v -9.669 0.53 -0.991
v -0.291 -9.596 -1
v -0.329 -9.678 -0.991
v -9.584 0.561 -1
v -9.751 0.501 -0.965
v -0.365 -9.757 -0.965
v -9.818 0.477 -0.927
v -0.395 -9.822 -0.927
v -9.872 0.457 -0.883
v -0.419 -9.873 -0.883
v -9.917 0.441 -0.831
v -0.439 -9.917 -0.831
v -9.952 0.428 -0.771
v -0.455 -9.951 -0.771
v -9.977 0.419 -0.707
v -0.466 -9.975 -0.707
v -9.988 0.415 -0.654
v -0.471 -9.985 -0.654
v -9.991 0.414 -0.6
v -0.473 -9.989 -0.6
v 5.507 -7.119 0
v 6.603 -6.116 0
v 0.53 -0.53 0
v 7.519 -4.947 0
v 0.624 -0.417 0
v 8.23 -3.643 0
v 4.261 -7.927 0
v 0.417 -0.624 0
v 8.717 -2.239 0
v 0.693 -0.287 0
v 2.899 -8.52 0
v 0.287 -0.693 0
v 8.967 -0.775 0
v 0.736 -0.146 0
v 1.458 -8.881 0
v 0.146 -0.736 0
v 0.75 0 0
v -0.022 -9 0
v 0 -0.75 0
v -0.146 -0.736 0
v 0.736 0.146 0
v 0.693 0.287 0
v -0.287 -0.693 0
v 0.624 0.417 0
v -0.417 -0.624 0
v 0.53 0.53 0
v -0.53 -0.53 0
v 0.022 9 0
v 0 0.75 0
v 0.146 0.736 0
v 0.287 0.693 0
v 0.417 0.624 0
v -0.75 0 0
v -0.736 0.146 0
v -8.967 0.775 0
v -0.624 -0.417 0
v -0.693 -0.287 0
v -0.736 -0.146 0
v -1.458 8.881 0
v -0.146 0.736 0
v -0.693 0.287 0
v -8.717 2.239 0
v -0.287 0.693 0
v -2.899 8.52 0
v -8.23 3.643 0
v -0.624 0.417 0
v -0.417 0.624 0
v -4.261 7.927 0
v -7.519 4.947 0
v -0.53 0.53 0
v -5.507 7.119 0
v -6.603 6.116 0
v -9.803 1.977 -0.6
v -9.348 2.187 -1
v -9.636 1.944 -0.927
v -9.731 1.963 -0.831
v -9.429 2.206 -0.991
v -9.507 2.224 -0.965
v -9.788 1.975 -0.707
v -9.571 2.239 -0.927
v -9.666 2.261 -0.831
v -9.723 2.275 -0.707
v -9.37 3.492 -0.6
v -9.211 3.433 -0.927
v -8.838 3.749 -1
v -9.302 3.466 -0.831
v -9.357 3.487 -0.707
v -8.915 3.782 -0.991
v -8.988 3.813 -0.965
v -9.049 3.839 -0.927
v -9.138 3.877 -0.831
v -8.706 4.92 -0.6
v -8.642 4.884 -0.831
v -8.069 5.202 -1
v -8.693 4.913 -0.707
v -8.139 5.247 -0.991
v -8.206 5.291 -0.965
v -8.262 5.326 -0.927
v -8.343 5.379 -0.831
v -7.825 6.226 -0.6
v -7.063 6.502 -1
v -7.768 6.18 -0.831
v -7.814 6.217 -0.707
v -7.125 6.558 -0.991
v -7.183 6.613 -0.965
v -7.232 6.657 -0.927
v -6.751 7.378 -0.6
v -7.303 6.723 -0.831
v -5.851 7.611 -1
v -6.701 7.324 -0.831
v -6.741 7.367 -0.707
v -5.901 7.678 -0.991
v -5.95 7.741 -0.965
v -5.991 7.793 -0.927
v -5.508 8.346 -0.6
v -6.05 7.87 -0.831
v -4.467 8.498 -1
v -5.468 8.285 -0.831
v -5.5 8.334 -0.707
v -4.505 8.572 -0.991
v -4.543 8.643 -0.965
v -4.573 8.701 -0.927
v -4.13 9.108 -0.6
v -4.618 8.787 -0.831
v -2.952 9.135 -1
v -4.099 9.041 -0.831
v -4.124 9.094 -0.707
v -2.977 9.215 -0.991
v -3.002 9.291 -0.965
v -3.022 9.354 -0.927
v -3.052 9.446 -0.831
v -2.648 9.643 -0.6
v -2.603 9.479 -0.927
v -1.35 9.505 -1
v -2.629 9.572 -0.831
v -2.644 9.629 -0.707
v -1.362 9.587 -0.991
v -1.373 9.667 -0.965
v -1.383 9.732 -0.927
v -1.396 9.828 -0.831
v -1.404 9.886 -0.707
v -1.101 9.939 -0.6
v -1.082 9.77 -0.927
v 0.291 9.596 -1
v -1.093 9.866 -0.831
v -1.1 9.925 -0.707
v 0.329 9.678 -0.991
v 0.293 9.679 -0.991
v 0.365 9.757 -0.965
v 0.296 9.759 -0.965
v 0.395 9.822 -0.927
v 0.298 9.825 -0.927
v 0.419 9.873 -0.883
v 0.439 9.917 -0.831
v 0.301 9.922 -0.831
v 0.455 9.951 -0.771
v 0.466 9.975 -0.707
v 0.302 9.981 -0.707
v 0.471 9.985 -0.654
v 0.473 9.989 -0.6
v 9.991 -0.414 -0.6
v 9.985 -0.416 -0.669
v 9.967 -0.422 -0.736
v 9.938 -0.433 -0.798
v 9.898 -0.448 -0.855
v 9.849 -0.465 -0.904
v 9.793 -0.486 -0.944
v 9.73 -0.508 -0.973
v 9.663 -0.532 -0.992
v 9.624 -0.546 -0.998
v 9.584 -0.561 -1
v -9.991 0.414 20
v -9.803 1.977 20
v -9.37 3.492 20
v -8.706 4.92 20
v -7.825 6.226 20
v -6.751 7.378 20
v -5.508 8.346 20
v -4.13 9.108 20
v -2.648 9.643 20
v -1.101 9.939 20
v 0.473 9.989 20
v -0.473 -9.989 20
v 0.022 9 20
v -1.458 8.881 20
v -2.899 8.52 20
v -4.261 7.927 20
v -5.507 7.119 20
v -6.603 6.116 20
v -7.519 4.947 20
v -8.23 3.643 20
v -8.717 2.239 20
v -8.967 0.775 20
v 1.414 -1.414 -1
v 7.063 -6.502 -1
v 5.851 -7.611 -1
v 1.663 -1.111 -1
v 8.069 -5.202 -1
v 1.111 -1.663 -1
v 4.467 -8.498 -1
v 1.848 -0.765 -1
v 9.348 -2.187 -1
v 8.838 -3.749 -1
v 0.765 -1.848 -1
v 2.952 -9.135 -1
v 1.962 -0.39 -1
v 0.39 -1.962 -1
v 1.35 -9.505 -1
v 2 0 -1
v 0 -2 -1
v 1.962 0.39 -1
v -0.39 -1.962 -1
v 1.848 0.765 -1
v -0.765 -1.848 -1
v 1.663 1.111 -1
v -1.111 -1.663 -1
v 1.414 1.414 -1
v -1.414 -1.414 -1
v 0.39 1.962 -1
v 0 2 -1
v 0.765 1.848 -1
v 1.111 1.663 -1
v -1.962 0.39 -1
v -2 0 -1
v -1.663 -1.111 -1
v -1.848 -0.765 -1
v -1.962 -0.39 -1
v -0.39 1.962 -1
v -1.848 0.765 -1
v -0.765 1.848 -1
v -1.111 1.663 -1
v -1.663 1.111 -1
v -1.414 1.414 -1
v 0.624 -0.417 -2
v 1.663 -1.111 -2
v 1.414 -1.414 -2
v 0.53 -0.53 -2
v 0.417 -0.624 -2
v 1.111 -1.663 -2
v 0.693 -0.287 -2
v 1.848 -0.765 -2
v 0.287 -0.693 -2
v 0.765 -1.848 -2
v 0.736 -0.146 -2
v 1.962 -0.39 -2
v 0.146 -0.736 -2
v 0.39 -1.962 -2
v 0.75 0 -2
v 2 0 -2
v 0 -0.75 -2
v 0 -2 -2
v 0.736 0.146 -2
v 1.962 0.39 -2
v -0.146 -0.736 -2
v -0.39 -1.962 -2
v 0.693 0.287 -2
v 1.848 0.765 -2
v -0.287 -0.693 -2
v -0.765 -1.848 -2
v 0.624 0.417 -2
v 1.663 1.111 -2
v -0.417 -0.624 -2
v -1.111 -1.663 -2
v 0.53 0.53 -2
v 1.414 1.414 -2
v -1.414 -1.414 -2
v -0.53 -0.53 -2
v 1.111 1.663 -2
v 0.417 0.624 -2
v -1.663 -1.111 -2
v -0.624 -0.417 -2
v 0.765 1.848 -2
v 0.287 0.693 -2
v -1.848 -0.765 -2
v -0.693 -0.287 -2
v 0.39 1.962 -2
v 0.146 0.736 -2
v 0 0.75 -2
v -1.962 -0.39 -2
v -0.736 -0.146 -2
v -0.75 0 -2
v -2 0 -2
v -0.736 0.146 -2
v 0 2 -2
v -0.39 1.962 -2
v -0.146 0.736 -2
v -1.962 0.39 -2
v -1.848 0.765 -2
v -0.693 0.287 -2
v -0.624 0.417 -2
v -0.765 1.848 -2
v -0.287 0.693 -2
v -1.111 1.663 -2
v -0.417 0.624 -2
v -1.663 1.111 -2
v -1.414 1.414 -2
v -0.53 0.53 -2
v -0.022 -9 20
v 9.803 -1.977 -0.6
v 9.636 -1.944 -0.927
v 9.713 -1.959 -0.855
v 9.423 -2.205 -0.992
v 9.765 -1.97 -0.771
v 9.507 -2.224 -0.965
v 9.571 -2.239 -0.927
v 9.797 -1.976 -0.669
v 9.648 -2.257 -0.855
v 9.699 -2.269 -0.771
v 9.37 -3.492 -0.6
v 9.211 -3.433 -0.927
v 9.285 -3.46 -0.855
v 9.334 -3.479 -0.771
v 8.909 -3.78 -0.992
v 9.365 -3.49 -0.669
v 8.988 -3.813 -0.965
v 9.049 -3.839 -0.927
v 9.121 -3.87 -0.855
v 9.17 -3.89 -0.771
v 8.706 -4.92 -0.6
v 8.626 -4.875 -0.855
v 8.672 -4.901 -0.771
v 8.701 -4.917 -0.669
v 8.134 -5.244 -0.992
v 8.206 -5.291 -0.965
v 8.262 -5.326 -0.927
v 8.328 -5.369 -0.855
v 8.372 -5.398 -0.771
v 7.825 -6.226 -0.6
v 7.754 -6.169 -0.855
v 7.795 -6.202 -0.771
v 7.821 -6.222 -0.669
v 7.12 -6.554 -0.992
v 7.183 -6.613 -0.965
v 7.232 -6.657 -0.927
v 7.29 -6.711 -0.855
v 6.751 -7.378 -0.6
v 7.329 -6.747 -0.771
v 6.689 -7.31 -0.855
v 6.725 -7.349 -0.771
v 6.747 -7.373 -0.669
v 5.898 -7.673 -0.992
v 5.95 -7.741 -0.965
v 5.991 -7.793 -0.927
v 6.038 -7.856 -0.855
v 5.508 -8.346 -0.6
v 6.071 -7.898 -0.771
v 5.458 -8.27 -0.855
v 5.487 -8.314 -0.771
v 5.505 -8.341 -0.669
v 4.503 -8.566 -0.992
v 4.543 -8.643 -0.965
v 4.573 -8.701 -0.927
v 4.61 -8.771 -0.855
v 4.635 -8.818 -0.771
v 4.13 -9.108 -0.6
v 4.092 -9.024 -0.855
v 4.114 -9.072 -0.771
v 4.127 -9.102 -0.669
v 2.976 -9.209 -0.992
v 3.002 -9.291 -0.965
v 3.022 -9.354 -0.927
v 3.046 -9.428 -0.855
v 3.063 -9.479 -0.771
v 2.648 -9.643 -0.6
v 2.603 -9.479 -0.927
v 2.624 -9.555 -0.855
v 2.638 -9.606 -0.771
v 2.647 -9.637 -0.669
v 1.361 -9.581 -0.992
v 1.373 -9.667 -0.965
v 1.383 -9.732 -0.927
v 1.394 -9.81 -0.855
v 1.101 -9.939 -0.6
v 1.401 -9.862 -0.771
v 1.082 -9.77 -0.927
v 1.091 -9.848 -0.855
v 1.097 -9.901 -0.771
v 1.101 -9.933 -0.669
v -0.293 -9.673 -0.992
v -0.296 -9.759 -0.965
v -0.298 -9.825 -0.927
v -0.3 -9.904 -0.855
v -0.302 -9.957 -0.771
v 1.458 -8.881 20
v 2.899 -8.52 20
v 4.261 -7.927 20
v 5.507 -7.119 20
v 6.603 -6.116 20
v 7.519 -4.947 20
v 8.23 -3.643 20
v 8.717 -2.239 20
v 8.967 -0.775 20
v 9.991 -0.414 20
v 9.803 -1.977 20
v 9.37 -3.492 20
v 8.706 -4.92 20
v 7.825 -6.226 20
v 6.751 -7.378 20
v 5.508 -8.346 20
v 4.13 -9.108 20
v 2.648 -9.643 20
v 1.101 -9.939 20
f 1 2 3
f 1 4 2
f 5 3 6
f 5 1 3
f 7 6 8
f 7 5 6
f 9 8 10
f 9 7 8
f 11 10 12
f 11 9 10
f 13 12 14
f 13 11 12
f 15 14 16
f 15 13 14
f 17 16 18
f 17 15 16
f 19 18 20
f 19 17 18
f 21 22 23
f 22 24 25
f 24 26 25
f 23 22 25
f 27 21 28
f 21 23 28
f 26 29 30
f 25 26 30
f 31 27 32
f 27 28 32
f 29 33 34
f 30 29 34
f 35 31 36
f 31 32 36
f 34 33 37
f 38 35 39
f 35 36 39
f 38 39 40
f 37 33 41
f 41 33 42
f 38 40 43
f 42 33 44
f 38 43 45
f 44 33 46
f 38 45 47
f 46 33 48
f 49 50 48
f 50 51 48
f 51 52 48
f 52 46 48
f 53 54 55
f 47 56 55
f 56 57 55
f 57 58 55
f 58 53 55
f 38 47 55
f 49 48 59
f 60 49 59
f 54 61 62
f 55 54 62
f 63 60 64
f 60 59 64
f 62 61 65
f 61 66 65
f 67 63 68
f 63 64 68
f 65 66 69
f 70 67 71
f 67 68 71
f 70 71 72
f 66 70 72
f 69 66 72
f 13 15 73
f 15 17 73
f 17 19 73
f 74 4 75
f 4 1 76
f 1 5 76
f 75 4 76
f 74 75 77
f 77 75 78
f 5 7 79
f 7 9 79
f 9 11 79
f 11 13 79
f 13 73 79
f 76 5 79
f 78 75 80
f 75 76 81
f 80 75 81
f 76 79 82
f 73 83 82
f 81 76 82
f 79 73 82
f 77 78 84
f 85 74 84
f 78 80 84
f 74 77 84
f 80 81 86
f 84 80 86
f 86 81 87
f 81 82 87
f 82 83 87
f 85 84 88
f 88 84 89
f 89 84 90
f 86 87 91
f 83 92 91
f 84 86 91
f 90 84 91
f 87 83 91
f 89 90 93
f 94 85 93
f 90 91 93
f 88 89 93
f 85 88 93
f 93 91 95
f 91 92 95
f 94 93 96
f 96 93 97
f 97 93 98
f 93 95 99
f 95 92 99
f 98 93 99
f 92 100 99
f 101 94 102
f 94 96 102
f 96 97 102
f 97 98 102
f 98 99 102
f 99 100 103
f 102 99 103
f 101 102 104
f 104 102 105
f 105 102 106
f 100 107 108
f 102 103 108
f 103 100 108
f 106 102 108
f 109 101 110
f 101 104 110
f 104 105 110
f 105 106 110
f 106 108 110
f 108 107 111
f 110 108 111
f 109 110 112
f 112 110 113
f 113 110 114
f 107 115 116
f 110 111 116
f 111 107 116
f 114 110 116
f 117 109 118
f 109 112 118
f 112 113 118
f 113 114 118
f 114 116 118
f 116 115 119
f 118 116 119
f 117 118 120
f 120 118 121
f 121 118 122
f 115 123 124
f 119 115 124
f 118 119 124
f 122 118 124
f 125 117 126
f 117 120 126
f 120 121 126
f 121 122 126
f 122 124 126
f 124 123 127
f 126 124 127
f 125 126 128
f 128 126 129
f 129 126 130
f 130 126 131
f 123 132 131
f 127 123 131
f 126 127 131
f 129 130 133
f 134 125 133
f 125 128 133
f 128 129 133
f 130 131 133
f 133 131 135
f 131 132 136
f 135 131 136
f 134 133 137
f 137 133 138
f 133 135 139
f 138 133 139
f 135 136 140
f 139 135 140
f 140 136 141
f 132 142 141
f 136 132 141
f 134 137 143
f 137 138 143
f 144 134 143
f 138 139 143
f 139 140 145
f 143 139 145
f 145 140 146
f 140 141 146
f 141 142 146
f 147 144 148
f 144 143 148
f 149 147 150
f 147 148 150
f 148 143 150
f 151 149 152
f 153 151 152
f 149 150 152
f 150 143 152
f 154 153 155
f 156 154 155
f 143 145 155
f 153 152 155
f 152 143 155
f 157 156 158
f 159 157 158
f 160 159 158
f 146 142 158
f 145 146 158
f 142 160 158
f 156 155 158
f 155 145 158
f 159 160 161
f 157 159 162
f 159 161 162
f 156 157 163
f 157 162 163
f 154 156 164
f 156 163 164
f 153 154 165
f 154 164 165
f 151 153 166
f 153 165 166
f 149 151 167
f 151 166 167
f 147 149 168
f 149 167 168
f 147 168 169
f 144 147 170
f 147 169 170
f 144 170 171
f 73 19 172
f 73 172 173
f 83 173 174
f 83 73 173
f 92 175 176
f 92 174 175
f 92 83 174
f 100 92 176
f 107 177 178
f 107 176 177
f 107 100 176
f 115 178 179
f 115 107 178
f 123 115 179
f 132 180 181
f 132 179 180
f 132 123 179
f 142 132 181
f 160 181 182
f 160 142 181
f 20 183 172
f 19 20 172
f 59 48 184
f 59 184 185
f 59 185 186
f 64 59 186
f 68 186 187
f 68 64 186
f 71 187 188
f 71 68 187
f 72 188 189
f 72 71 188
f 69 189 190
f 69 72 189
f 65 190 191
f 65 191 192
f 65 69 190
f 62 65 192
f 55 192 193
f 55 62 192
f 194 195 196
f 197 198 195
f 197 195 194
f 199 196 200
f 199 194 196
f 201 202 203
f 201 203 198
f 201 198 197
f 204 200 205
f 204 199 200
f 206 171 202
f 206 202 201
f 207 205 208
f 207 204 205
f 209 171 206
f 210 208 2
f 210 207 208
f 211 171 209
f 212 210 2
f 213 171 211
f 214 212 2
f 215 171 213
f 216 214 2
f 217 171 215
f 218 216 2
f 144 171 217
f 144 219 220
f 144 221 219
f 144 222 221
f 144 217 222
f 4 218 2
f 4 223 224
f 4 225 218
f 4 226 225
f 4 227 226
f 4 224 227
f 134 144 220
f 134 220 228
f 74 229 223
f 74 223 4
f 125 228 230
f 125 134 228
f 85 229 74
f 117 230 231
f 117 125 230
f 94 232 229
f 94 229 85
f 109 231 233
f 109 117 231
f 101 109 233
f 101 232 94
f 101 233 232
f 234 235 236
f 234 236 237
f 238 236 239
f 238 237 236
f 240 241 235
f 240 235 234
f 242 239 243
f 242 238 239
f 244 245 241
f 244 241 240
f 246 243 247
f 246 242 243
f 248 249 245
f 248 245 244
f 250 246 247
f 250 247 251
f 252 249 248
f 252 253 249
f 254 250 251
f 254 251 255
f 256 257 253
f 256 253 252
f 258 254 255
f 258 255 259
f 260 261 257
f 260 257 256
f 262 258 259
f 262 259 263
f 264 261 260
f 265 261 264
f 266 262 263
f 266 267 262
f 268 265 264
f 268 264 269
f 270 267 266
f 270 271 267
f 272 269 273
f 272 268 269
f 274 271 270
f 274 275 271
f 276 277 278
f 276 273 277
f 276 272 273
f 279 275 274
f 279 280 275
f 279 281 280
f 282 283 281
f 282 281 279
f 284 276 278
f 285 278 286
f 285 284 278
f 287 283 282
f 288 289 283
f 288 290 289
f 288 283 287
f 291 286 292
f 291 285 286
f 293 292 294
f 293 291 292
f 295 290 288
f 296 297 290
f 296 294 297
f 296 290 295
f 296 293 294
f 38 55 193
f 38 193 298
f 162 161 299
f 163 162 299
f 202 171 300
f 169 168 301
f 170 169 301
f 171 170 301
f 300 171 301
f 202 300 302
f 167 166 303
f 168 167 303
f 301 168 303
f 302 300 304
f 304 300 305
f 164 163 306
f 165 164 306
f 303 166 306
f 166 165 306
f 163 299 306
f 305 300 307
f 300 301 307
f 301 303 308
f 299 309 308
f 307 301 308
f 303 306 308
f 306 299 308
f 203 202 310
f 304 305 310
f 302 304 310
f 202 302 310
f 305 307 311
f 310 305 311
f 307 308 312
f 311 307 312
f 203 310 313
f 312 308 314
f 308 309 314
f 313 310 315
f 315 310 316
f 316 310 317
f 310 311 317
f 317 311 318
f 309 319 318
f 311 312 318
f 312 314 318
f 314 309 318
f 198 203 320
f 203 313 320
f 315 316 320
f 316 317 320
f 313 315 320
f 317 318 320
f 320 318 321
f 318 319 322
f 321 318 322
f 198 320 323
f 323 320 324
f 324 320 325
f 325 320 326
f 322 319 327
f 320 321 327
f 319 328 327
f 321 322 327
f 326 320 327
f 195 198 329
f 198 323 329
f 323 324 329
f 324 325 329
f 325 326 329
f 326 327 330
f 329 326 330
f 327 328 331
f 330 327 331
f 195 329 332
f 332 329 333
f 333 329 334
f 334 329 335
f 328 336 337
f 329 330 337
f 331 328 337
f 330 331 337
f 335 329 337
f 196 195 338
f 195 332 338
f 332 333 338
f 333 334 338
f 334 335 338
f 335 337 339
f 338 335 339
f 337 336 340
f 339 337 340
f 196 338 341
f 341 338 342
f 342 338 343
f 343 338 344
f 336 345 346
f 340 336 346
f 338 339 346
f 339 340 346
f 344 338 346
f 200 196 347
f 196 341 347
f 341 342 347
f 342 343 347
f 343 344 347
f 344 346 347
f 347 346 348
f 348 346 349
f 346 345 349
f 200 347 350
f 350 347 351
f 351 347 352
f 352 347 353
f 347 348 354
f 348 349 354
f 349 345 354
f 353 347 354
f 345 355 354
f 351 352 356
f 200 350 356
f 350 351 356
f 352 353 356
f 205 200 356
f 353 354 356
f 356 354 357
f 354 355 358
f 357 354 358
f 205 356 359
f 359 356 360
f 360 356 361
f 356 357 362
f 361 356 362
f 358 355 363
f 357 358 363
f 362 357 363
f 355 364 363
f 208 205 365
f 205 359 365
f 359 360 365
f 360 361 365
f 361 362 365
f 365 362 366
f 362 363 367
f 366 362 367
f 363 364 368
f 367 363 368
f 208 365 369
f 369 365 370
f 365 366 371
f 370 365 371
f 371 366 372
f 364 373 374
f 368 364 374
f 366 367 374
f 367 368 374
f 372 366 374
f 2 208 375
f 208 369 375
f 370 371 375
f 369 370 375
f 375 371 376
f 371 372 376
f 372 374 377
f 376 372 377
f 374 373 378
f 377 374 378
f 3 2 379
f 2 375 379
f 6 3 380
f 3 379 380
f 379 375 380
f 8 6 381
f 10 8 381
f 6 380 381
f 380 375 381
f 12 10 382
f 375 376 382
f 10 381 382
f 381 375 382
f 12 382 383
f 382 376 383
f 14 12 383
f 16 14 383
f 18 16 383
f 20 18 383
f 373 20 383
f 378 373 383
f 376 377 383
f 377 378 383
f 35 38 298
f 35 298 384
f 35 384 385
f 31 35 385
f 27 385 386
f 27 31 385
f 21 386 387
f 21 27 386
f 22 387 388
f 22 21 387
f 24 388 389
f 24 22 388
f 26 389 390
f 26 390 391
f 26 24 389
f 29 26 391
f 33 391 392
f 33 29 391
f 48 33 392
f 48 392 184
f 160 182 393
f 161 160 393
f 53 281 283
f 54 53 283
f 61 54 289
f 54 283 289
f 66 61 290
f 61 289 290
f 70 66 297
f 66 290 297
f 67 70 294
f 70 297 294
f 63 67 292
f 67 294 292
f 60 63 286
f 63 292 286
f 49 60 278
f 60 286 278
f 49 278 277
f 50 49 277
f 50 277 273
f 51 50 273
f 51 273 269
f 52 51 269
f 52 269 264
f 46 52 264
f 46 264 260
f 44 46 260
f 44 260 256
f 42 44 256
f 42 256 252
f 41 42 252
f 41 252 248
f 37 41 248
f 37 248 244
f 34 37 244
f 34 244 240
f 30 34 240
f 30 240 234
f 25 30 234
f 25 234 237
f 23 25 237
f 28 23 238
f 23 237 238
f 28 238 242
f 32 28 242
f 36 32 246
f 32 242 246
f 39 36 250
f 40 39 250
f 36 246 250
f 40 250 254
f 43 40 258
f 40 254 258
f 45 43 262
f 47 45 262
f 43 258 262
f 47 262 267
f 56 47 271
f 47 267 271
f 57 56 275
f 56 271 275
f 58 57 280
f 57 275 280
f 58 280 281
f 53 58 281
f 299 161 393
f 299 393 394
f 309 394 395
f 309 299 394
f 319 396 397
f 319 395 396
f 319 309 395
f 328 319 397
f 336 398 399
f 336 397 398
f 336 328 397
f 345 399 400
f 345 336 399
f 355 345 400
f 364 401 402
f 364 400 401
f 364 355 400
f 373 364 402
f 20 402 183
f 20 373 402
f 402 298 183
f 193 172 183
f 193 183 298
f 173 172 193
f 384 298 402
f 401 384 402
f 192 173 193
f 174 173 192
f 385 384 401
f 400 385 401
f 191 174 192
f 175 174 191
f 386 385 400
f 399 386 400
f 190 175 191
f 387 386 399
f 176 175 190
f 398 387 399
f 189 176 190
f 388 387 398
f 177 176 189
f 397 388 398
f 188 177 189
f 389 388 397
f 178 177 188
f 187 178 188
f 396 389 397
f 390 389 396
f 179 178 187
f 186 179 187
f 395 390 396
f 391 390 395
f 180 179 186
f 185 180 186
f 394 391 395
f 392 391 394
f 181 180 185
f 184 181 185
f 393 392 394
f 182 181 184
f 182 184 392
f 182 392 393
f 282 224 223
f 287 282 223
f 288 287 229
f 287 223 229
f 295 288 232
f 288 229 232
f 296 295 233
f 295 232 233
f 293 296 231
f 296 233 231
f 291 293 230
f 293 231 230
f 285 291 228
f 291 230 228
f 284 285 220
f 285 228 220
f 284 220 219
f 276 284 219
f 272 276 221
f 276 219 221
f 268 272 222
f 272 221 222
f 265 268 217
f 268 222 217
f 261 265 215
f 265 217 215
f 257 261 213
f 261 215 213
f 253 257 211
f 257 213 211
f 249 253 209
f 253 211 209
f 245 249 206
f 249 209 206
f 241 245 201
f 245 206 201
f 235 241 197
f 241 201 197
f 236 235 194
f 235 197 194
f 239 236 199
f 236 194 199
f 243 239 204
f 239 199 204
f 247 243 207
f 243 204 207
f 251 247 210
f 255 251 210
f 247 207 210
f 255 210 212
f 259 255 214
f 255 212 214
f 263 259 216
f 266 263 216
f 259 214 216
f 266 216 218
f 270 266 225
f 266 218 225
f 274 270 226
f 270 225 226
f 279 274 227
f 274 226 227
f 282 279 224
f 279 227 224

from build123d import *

# Parameters (mm, degrees)
BOSS_EXTRUDE1_DEPTH = 20
BOSS_EXTRUDE2_START = 1
BOSS_EXTRUDE2_DEPTH = 1
FILLET1_R           = 0.4
SKETCH3_R           = 2
BOSS_EXTRUDE3_DEPTH = 1
SKETCH4_R           = 0.75
CUT_EXTRUDE1_DEPTH  = 27.150121814


with BuildPart() as part:
    # Sketch1 → Boss-Extrude1 (new body)
    with BuildSketch(Plane.XY):
        with BuildLine():
            Line((-9.991439682, 0.413682349), (-0.473124093, -9.988801409))
            ThreePointArc((-0.473124093, -9.988801409), (6.750578432, -7.377648056), (9.991439682, -0.413682349))
            Line((9.991439682, -0.413682349), (0.473124093, 9.988801409))
            ThreePointArc((0.473124093, 9.988801409), (-6.750578432, 7.377648056), (-9.991439682, 0.413682349))
        make_face()
        with BuildLine():
            Line((-8.966572571, 0.774968597), (-0.022461592, -8.999971971))
            ThreePointArc((-0.022461592, -8.999971971), (6.075520589, -6.63988325), (8.966572571, -0.774968597))
            Line((8.966572571, -0.774968597), (0.022461592, 8.999971971))
            ThreePointArc((0.022461592, 8.999971971), (-6.075520589, 6.63988325), (-8.966572571, 0.774968597))
        make_face(mode=Mode.SUBTRACT)
    extrude(amount=BOSS_EXTRUDE1_DEPTH)

    # Sketch2 → Boss-Extrude2 (add)
    with BuildSketch(Plane(origin=(0, 0, 0), x_dir=(-1, 0, 0), z_dir=(0, 0, -1)).offset(BOSS_EXTRUDE2_START)):
        with BuildLine():
            Line((-0.473124093, 9.988801409), (-9.991439682, -0.413682349))
            ThreePointArc((-9.991439682, -0.413682349), (-6.750578432, -7.377648056), (0.473124093, -9.988801409))
            Line((0.473124093, -9.988801409), (9.991439682, 0.413682349))
            ThreePointArc((9.991439682, 0.413682349), (6.750578432, 7.377648056), (-0.473124093, 9.988801409))
        make_face()
    extrude(amount=-BOSS_EXTRUDE2_DEPTH)

    # Fillet1
    fillet1_edges = [part.edges().sort_by_distance(p)[0] for p in [
        (-6.750578432, 7.377648056, -1),
        (5.232281887, 4.78755953, -1),
        (6.750578432, -7.377648056, -1),
        (-5.232281887, -4.78755953, -1),
    ]]
    fillet(fillet1_edges, radius=FILLET1_R)

    # Sketch3 → Boss-Extrude3 (add)
    with BuildSketch(Plane(origin=(0, 0, -1), x_dir=(-1, 0, 0), z_dir=(0, 0, -1))):
        Circle(SKETCH3_R)
    extrude(amount=BOSS_EXTRUDE3_DEPTH)

    # Sketch4 → Cut-Extrude1 (cut, through all)
    with BuildSketch(Plane(origin=(0, 0, -2), x_dir=(-1, 0, 0), z_dir=(0, 0, -1))):
        Circle(SKETCH4_R)
    extrude(amount=-CUT_EXTRUDE1_DEPTH, mode=Mode.SUBTRACT)


solid = part.part
